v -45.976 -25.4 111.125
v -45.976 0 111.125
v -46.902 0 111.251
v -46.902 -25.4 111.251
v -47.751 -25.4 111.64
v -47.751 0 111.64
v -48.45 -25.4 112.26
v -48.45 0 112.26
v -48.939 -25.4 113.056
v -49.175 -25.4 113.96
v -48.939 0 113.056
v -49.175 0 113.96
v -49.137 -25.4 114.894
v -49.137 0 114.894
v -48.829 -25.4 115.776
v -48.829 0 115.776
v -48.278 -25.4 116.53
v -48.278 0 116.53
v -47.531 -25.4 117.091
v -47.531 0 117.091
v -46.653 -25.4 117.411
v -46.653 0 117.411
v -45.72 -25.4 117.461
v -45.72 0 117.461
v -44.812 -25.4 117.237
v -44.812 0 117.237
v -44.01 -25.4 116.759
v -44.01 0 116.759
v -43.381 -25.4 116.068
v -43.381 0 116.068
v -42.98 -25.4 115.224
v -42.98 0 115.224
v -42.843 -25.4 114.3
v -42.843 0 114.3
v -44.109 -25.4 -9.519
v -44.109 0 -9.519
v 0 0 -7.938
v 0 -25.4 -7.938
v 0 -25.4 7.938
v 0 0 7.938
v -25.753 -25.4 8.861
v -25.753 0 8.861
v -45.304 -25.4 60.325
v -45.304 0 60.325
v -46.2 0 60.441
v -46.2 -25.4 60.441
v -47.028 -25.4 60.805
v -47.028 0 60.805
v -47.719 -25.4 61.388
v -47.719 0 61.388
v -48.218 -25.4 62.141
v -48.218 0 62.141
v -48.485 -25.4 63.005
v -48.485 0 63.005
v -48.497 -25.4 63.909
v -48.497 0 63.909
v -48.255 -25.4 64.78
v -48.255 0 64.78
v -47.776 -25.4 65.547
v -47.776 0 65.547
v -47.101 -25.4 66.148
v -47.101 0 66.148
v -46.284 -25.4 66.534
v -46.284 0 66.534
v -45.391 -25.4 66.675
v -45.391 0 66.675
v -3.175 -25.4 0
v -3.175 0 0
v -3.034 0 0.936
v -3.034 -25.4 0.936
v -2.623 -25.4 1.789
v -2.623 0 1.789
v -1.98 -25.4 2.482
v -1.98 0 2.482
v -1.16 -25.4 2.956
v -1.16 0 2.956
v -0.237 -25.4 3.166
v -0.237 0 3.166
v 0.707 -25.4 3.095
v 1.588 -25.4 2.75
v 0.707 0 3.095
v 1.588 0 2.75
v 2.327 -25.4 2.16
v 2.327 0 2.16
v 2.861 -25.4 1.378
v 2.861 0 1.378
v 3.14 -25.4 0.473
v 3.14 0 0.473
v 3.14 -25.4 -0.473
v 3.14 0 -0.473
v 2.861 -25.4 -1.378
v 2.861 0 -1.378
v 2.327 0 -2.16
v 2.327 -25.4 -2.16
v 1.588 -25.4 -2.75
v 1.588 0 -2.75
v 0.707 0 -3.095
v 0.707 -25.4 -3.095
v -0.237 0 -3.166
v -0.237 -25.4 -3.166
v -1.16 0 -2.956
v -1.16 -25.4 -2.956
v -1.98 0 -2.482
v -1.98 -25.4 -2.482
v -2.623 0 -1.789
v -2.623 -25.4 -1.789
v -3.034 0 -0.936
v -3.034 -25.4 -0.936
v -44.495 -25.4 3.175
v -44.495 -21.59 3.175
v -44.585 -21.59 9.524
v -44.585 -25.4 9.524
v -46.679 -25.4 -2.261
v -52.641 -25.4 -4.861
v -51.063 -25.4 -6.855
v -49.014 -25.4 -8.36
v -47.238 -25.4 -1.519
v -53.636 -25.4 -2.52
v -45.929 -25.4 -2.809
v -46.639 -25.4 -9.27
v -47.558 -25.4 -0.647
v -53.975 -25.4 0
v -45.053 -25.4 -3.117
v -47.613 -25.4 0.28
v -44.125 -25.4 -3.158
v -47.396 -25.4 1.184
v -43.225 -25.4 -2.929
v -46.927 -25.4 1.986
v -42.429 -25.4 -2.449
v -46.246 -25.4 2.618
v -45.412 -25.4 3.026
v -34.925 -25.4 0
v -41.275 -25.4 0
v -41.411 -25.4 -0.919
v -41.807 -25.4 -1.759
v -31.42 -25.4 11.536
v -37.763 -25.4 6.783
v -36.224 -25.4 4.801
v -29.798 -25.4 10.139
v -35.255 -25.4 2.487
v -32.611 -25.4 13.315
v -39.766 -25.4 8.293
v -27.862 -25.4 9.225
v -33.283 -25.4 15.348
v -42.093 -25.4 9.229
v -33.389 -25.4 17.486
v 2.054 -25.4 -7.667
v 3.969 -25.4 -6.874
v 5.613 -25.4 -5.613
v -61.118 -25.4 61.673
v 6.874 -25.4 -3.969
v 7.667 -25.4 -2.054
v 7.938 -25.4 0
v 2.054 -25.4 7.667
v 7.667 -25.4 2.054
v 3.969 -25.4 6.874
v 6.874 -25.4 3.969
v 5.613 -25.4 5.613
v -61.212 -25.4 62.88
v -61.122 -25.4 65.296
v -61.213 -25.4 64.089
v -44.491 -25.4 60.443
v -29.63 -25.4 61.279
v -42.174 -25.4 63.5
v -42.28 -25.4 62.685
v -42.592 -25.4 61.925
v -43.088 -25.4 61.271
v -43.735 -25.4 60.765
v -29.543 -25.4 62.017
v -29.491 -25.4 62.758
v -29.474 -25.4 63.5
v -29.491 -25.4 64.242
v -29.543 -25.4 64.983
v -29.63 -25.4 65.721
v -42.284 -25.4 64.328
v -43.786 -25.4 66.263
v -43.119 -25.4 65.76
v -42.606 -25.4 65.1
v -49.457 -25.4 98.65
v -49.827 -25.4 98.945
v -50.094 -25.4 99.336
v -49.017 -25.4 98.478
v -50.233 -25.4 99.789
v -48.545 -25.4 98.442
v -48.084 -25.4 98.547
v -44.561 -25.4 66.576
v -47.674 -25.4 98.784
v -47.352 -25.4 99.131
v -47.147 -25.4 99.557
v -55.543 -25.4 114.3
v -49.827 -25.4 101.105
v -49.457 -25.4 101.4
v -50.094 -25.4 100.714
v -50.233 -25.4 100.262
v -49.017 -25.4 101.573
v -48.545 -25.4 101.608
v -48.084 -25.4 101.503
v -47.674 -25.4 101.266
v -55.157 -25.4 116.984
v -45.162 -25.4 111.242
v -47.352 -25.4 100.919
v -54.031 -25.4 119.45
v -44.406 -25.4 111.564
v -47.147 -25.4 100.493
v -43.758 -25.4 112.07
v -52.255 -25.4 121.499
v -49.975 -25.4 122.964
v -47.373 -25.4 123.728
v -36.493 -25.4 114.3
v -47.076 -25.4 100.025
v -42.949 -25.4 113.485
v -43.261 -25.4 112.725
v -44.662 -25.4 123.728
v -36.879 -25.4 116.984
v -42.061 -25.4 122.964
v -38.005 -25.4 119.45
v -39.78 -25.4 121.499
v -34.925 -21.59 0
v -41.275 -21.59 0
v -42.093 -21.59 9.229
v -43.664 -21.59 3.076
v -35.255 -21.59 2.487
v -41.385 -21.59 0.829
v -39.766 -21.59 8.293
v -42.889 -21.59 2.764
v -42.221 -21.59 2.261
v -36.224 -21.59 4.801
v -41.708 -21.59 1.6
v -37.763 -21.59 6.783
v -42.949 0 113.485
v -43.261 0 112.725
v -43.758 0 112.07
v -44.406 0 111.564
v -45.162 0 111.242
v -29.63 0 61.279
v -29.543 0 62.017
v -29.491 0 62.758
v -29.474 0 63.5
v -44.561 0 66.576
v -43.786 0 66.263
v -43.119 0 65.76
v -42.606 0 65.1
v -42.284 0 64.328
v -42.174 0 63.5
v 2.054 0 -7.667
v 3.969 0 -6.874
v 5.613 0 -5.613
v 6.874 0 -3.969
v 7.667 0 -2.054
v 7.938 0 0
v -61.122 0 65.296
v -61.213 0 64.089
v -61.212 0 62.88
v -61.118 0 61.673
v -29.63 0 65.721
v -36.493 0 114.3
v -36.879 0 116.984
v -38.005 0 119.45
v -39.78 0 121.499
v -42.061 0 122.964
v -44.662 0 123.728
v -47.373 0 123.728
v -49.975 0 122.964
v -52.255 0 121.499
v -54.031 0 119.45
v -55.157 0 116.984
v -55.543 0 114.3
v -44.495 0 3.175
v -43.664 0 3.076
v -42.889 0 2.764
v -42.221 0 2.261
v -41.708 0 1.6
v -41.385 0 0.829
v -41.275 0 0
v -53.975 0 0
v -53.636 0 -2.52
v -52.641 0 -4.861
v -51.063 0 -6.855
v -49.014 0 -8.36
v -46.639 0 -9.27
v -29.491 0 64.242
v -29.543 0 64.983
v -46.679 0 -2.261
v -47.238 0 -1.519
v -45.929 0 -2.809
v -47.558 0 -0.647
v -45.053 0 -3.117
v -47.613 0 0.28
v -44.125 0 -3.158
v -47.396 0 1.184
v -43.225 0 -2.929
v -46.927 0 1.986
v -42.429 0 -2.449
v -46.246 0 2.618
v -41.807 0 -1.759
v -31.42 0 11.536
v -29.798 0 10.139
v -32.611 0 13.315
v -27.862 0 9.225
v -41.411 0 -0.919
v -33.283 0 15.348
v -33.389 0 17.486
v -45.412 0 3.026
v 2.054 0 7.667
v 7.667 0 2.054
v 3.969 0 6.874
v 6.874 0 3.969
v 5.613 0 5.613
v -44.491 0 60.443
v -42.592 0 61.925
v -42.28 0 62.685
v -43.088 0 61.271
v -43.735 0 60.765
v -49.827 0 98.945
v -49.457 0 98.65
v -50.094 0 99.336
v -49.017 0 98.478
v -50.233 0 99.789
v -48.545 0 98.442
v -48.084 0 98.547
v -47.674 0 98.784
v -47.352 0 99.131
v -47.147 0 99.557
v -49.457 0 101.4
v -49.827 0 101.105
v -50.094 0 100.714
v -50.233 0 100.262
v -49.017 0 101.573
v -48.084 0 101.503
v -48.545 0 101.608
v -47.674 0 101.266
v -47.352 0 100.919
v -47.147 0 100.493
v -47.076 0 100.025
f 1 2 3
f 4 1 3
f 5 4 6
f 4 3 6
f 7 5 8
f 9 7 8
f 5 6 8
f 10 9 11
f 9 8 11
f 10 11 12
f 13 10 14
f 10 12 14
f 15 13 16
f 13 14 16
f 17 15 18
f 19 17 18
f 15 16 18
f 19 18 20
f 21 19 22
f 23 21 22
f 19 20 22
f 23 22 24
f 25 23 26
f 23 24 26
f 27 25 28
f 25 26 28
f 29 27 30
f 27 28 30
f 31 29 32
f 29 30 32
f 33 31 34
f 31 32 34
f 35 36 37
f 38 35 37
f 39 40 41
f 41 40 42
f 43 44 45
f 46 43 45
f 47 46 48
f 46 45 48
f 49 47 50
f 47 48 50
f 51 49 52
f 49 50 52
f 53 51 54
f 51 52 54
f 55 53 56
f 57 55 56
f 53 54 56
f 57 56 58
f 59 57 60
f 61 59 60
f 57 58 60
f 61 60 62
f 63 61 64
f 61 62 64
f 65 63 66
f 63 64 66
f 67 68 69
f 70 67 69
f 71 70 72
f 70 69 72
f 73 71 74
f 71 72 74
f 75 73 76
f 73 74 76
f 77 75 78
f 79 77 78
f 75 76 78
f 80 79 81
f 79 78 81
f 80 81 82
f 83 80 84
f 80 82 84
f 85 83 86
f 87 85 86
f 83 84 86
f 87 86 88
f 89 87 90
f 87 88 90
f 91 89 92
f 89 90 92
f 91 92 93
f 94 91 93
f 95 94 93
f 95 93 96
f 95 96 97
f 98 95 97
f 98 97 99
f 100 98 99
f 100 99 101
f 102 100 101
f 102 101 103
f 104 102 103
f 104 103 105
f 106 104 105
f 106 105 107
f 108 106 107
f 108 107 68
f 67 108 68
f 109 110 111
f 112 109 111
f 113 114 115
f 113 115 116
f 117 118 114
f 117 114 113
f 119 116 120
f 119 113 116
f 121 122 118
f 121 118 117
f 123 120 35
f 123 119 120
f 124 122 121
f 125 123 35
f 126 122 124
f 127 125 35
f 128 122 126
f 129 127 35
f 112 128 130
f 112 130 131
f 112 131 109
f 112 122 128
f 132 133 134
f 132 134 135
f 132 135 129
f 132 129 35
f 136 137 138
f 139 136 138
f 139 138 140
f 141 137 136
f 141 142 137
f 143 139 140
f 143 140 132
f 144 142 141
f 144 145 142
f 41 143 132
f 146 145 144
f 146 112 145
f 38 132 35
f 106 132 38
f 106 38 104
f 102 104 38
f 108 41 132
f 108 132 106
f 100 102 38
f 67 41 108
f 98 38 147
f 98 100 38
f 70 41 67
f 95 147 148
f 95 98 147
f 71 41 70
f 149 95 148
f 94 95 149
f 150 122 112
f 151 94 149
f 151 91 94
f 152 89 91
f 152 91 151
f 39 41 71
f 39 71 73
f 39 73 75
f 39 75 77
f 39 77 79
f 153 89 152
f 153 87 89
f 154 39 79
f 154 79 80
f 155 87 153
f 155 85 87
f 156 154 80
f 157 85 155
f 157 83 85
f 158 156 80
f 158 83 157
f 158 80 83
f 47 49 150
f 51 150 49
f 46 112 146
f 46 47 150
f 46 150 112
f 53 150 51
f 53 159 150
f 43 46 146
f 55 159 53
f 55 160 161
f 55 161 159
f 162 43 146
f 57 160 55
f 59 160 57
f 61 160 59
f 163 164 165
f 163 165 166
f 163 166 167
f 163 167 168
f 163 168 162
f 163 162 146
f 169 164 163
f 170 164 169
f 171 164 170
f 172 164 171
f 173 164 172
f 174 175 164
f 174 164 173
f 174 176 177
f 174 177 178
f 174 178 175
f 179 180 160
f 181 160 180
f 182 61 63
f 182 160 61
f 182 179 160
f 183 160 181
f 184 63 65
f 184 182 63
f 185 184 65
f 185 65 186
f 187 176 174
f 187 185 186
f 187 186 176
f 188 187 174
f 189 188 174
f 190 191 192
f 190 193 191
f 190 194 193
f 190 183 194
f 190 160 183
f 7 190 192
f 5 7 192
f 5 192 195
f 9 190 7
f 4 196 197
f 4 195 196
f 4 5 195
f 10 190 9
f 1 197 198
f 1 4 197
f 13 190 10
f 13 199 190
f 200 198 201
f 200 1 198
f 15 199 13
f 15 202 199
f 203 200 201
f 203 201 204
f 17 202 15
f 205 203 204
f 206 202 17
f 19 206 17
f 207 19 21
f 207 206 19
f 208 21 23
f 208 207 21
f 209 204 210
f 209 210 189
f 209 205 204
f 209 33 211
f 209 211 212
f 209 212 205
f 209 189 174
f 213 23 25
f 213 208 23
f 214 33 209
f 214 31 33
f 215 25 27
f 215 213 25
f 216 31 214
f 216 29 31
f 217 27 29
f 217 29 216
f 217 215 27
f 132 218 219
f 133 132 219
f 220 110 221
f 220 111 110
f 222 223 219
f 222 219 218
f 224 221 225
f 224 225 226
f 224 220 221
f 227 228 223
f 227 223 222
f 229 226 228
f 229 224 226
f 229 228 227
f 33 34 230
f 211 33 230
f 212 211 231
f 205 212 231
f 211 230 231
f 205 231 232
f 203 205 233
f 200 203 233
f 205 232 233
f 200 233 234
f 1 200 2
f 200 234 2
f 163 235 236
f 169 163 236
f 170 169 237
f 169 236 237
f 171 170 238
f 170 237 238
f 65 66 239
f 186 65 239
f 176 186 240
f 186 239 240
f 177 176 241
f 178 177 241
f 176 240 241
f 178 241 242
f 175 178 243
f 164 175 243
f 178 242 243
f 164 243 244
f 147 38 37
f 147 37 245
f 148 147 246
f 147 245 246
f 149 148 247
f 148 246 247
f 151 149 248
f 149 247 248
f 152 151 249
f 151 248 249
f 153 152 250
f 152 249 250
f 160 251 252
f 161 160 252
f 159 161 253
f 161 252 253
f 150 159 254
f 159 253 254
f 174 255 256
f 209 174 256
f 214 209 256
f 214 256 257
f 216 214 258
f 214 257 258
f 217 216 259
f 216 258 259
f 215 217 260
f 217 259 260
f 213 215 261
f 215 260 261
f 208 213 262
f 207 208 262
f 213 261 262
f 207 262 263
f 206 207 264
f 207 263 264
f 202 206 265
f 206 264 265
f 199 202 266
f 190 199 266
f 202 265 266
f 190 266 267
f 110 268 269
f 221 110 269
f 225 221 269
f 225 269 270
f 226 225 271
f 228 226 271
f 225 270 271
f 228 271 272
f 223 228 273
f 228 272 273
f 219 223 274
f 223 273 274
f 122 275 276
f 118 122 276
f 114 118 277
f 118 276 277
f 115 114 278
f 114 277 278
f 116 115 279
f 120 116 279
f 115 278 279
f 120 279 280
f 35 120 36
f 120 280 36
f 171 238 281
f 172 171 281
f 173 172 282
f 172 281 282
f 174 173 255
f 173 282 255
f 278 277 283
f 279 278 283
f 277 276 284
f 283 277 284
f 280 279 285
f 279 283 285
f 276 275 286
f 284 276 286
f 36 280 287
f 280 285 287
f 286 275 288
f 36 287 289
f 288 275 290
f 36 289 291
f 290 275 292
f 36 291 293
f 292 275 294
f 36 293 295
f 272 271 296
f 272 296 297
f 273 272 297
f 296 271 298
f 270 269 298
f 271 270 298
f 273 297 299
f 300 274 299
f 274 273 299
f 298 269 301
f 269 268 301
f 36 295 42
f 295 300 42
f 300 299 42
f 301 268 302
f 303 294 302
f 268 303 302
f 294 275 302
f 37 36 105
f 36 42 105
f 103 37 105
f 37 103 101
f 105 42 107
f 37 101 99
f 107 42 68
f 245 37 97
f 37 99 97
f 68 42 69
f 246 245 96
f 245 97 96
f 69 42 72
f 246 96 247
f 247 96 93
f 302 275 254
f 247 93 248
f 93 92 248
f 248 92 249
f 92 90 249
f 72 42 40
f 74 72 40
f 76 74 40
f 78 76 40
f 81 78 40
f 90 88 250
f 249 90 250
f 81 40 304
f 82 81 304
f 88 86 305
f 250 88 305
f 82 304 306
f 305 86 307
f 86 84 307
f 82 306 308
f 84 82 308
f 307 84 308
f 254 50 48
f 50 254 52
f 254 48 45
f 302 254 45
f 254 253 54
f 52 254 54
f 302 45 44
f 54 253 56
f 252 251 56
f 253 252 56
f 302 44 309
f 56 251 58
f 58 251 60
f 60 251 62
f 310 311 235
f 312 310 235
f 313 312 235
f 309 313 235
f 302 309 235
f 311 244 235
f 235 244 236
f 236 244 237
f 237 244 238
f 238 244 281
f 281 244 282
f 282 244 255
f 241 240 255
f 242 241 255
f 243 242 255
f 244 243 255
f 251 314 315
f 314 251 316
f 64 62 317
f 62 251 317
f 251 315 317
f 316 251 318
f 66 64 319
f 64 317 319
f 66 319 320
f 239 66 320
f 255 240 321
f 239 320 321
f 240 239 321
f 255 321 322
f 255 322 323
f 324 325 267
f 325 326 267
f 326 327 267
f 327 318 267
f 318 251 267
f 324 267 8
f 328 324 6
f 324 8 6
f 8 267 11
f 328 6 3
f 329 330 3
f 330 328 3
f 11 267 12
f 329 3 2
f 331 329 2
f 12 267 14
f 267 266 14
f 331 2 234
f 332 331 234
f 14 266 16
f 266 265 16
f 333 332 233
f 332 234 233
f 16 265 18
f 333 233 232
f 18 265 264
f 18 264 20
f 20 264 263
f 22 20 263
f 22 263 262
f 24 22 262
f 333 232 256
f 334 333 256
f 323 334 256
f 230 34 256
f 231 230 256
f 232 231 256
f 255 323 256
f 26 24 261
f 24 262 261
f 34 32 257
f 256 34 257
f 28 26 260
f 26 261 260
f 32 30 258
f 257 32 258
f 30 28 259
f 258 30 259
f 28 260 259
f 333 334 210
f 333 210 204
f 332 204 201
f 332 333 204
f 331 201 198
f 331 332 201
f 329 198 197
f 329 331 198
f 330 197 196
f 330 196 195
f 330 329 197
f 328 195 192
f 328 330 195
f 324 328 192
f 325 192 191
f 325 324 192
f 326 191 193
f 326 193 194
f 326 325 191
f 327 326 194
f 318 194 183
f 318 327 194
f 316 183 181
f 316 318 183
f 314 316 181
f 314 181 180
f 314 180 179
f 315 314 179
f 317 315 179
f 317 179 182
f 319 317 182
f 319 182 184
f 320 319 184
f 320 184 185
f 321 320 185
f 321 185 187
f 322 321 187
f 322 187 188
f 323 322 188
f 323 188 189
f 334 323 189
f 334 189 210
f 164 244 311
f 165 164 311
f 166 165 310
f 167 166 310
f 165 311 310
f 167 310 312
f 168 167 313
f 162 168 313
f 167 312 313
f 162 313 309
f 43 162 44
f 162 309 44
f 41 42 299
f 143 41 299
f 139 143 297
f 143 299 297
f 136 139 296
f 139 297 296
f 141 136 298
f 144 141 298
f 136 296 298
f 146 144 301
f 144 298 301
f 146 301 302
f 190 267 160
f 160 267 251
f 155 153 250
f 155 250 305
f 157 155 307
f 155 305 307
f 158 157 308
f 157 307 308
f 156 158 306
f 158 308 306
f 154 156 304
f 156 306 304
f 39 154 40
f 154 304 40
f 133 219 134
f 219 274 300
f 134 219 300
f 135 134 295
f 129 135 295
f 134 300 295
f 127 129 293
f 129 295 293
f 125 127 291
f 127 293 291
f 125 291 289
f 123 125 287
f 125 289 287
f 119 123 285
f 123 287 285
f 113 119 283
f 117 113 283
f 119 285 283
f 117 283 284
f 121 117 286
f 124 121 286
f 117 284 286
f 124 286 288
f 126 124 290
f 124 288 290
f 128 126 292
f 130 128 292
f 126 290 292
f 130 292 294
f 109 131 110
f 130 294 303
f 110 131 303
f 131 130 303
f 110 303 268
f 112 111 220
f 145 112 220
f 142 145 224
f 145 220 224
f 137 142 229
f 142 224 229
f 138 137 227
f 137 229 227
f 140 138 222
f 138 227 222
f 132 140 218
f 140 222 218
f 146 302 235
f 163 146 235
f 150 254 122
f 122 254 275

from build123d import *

# Parameters (mm, degrees)
F0_R     = 1.5875
F1_DEPTH = 25.4
F2_DEPTH = 21.59


with BuildPart() as f1:
    # F0 (on Front) → F1 (new body)
    with BuildSketch(Plane.XZ):
        with BuildLine():
            ThreePointArc((-45.8923771413, 104.7758257242), (-39.2384052999, 107.6092963617), (-36.4927939024, 114.3))
            ThreePointArc((-36.4927939024, 114.3), (-46.0177939024, 123.825), (-55.5427939024, 114.3))
            ThreePointArc((-55.5427939024, 114.3), (-52.7084975407, 107.5206113974), (-45.8923771413, 104.7758257242))
        make_face()
        with BuildLine():
            ThreePointArc((-42.8427939024, 114.3), (-43.7579977016, 112.0697654539), (-45.9759883154, 111.1252752414))
            ThreePointArc((-45.9759883154, 111.1252752414), (-48.2775901033, 116.5302345461), (-42.8427939024, 114.3))
        make_face(mode=Mode.SUBTRACT)
        with BuildLine():
            Line((-29.6299272337, 65.7206308807), (-36.4927939024, 114.3))
            ThreePointArc((-36.4927939024, 114.3), (-39.2384052999, 107.6092963617), (-45.8923771413, 104.7758257242))
            Line((-45.8923771413, 104.7758257242), (-45.5578744539, 79.373623793))
            ThreePointArc((-45.5578744539, 79.373623793), (-35.0173298688, 75.5530240484), (-29.6299272337, 65.7206308807))
        make_face()
        with BuildLine():
            ThreePointArc((-45.8923771413, 104.7758257242), (-52.7084975407, 107.5206113974), (-55.5427939024, 114.3))
            Line((-55.5427939024, 114.3), (-61.1219506134, 65.2957762162))
            ThreePointArc((-61.1219506134, 65.2957762162), (-55.9979584138, 75.2733614931), (-45.5578744539, 79.373623793))
            Line((-45.5578744539, 79.373623793), (-45.8923771413, 104.7758257242))
        make_face()
        with Locations((-48.6637000366, 100.0252)):
            Circle(F0_R, mode=Mode.SUBTRACT)
        with BuildLine():
            ThreePointArc((-29.4738465188, 63.5), (-29.5129147708, 64.6130546592), (-29.6299272337, 65.7206308807))
            ThreePointArc((-29.6299272337, 65.7206308807), (-35.0173298688, 75.5530240484), (-45.5578744539, 79.373623793))
            Line((-45.5578744539, 79.373623793), (-45.3906521058, 66.6747247586))
            ThreePointArc((-45.3906521058, 66.6747247586), (-43.1186119727, 65.7597962009), (-42.1738465188, 63.5))
            ThreePointArc((-42.1738465188, 63.5), (-43.087950392, 61.2708805092), (-45.3039086946, 60.3253180329))
            Line((-45.3039086946, 60.3253180329), (-45.124157398, 47.6265901647))
            ThreePointArc((-45.124157398, 47.6265901647), (-34.8536449701, 51.5892330451), (-29.6299272337, 61.2793691193))
            ThreePointArc((-29.6299272337, 61.2793691193), (-29.5129147708, 62.3869453408), (-29.4738465188, 63.5))
        make_face()
        with BuildLine():
            ThreePointArc((-45.5578744539, 79.373623793), (-55.9979584138, 75.2733614931), (-61.1219506134, 65.2957762162))
            ThreePointArc((-61.1219506134, 65.2957762162), (-61.2238389716, 63.4845202884), (-61.1184184978, 61.6734665075))
            ThreePointArc((-61.1184184978, 61.6734665075), (-55.8245101978, 51.5720456287), (-45.124157398, 47.6265901647))
            Line((-45.124157398, 47.6265901647), (-45.3039086946, 60.3253180329))
            ThreePointArc((-45.3039086946, 60.3253180329), (-48.5235502679, 63.4566282891), (-45.3906521058, 66.6747247586))
            Line((-45.3906521058, 66.6747247586), (-45.5578744539, 79.373623793))
        make_face()
        with BuildLine():
            ThreePointArc((-45.124157398, 47.6265901647), (-55.8245101978, 51.5720456287), (-61.1184184978, 61.6734665075))
            Line((-61.1184184978, 61.6734665075), (-53.975, 0))
            ThreePointArc((-53.975, 0), (-51.2326883802, 6.6873584723), (-44.5848134725, 9.5240459012))
            Line((-44.5848134725, 9.5240459012), (-45.124157398, 47.6265901647))
        make_face()
        with BuildLine():
            Line((-33.3890422301, 17.4858067619), (-29.6299272337, 61.2793691193))
            ThreePointArc((-29.6299272337, 61.2793691193), (-34.8536449701, 51.5892330451), (-45.124157398, 47.6265901647))
            Line((-45.124157398, 47.6265901647), (-44.5848134725, 9.5240459012))
            ThreePointArc((-44.5848134725, 9.5240459012), (-37.7626415277, 6.7826883802), (-34.925, 0))
            Line((-34.925, 0), (-7.9375, 0))
            ThreePointArc((-7.9375, 0), (-5.6126600757, 5.6126600757), (0, 7.9375))
            Line((0, 7.9375), (-25.7528172131, 8.8607889455))
            ThreePointArc((-25.7528172131, 8.8607889455), (-31.4204494391, 11.5358115277), (-33.3890422301, 17.4858067619))
        make_face()
        with BuildLine():
            ThreePointArc((-44.5848134725, 9.5240459012), (-51.2326883802, 6.6873584723), (-53.975, 0))
            ThreePointArc((-53.975, 0), (-51.0634341324, -6.8547876682), (-44.1087293489, -9.5188843539))
            ThreePointArc((-44.1087293489, -9.5188843539), (-37.5952123318, -6.6134341324), (-34.925, 0))
            Line((-34.925, 0), (-41.275, 0))
            ThreePointArc((-41.275, 0), (-46.6791194908, -2.2608961267), (-44.4949378242, 3.1746819671))
            Line((-44.4949378242, 3.1746819671), (-44.5848134725, 9.5240459012))
        make_face()
        with BuildLine():
            ThreePointArc((-34.925, 0), (-37.5952123318, -6.6134341324), (-44.1087293489, -9.5188843539))
            Line((-44.1087293489, -9.5188843539), (0, -7.9375))
            ThreePointArc((0, -7.9375), (-5.6126600757, -5.6126600757), (-7.9375, 0))
            Line((-7.9375, 0), (-34.925, 0))
        make_face()
        with BuildLine():
            ThreePointArc((-7.9375, 0), (-5.6126600757, -5.6126600757), (0, -7.9375))
            ThreePointArc((0, -7.9375), (5.6126600757, -5.6126600757), (7.9375, 0))
            ThreePointArc((7.9375, 0), (5.6126600757, 5.6126600757), (0, 7.9375))
            ThreePointArc((0, 7.9375), (-5.6126600757, 5.6126600757), (-7.9375, 0))
        make_face()
        with BuildLine():
            ThreePointArc((3.175, 0), (0, -3.175), (-3.175, 0))
            ThreePointArc((-3.175, 0), (0, 3.175), (3.175, 0))
        make_face(mode=Mode.SUBTRACT)
    extrude(amount=F1_DEPTH)

    # F0 (on Front) → F2 (join)
    with BuildSketch(Plane.XZ):
        with BuildLine():
            ThreePointArc((-45.8923771413, 104.7758257242), (-39.2384052999, 107.6092963617), (-36.4927939024, 114.3))
            ThreePointArc((-36.4927939024, 114.3), (-46.0177939024, 123.825), (-55.5427939024, 114.3))
            ThreePointArc((-55.5427939024, 114.3), (-52.7084975407, 107.5206113974), (-45.8923771413, 104.7758257242))
        make_face()
        with BuildLine():
            ThreePointArc((-42.8427939024, 114.3), (-43.7579977016, 112.0697654539), (-45.9759883154, 111.1252752414))
            ThreePointArc((-45.9759883154, 111.1252752414), (-48.2775901033, 116.5302345461), (-42.8427939024, 114.3))
        make_face(mode=Mode.SUBTRACT)
        with BuildLine():
            Line((-29.6299272337, 65.7206308807), (-36.4927939024, 114.3))
            ThreePointArc((-36.4927939024, 114.3), (-39.2384052999, 107.6092963617), (-45.8923771413, 104.7758257242))
            Line((-45.8923771413, 104.7758257242), (-45.5578744539, 79.373623793))
            ThreePointArc((-45.5578744539, 79.373623793), (-35.0173298688, 75.5530240484), (-29.6299272337, 65.7206308807))
        make_face()
        with BuildLine():
            ThreePointArc((-45.8923771413, 104.7758257242), (-52.7084975407, 107.5206113974), (-55.5427939024, 114.3))
            Line((-55.5427939024, 114.3), (-61.1219506134, 65.2957762162))
            ThreePointArc((-61.1219506134, 65.2957762162), (-55.9979584138, 75.2733614931), (-45.5578744539, 79.373623793))
            Line((-45.5578744539, 79.373623793), (-45.8923771413, 104.7758257242))
        make_face()
        with Locations((-48.6637000366, 100.0252)):
            Circle(F0_R, mode=Mode.SUBTRACT)
        with BuildLine():
            ThreePointArc((-29.4738465188, 63.5), (-29.5129147708, 64.6130546592), (-29.6299272337, 65.7206308807))
            ThreePointArc((-29.6299272337, 65.7206308807), (-35.0173298688, 75.5530240484), (-45.5578744539, 79.373623793))
            Line((-45.5578744539, 79.373623793), (-45.3906521058, 66.6747247586))
            ThreePointArc((-45.3906521058, 66.6747247586), (-43.1186119727, 65.7597962009), (-42.1738465188, 63.5))
            ThreePointArc((-42.1738465188, 63.5), (-43.087950392, 61.2708805092), (-45.3039086946, 60.3253180329))
            Line((-45.3039086946, 60.3253180329), (-45.124157398, 47.6265901647))
            ThreePointArc((-45.124157398, 47.6265901647), (-34.8536449701, 51.5892330451), (-29.6299272337, 61.2793691193))
            ThreePointArc((-29.6299272337, 61.2793691193), (-29.5129147708, 62.3869453408), (-29.4738465188, 63.5))
        make_face()
        with BuildLine():
            ThreePointArc((-45.5578744539, 79.373623793), (-55.9979584138, 75.2733614931), (-61.1219506134, 65.2957762162))
            ThreePointArc((-61.1219506134, 65.2957762162), (-61.2238389716, 63.4845202884), (-61.1184184978, 61.6734665075))
            ThreePointArc((-61.1184184978, 61.6734665075), (-55.8245101978, 51.5720456287), (-45.124157398, 47.6265901647))
            Line((-45.124157398, 47.6265901647), (-45.3039086946, 60.3253180329))
            ThreePointArc((-45.3039086946, 60.3253180329), (-48.5235502679, 63.4566282891), (-45.3906521058, 66.6747247586))
            Line((-45.3906521058, 66.6747247586), (-45.5578744539, 79.373623793))
        make_face()
        with BuildLine():
            ThreePointArc((-45.124157398, 47.6265901647), (-55.8245101978, 51.5720456287), (-61.1184184978, 61.6734665075))
            Line((-61.1184184978, 61.6734665075), (-53.975, 0))
            ThreePointArc((-53.975, 0), (-51.2326883802, 6.6873584723), (-44.5848134725, 9.5240459012))
            Line((-44.5848134725, 9.5240459012), (-45.124157398, 47.6265901647))
        make_face()
        with BuildLine():
            Line((-33.3890422301, 17.4858067619), (-29.6299272337, 61.2793691193))
            ThreePointArc((-29.6299272337, 61.2793691193), (-34.8536449701, 51.5892330451), (-45.124157398, 47.6265901647))
            Line((-45.124157398, 47.6265901647), (-44.5848134725, 9.5240459012))
            ThreePointArc((-44.5848134725, 9.5240459012), (-37.7626415277, 6.7826883802), (-34.925, 0))
            Line((-34.925, 0), (-7.9375, 0))
            ThreePointArc((-7.9375, 0), (-5.6126600757, 5.6126600757), (0, 7.9375))
            Line((0, 7.9375), (-25.7528172131, 8.8607889455))
            ThreePointArc((-25.7528172131, 8.8607889455), (-31.4204494391, 11.5358115277), (-33.3890422301, 17.4858067619))
        make_face()
        with BuildLine():
            ThreePointArc((-44.5848134725, 9.5240459012), (-51.2326883802, 6.6873584723), (-53.975, 0))
            ThreePointArc((-53.975, 0), (-51.0634341324, -6.8547876682), (-44.1087293489, -9.5188843539))
            ThreePointArc((-44.1087293489, -9.5188843539), (-37.5952123318, -6.6134341324), (-34.925, 0))
            Line((-34.925, 0), (-41.275, 0))
            ThreePointArc((-41.275, 0), (-46.6791194908, -2.2608961267), (-44.4949378242, 3.1746819671))
            Line((-44.4949378242, 3.1746819671), (-44.5848134725, 9.5240459012))
        make_face()
        with BuildLine():
            ThreePointArc((-34.925, 0), (-37.5952123318, -6.6134341324), (-44.1087293489, -9.5188843539))
            Line((-44.1087293489, -9.5188843539), (0, -7.9375))
            ThreePointArc((0, -7.9375), (-5.6126600757, -5.6126600757), (-7.9375, 0))
            Line((-7.9375, 0), (-34.925, 0))
        make_face()
        with BuildLine():
            ThreePointArc((-7.9375, 0), (-5.6126600757, -5.6126600757), (0, -7.9375))
            ThreePointArc((0, -7.9375), (5.6126600757, -5.6126600757), (7.9375, 0))
            ThreePointArc((7.9375, 0), (5.6126600757, 5.6126600757), (0, 7.9375))
            ThreePointArc((0, 7.9375), (-5.6126600757, 5.6126600757), (-7.9375, 0))
        make_face()
        with BuildLine():
            ThreePointArc((3.175, 0), (0, -3.175), (-3.175, 0))
            ThreePointArc((-3.175, 0), (0, 3.175), (3.175, 0))
        make_face(mode=Mode.SUBTRACT)
        with BuildLine():
            ThreePointArc((-34.925, 0), (-37.7626415277, 6.7826883802), (-44.5848134725, 9.5240459012))
            Line((-44.5848134725, 9.5240459012), (-44.4949378242, 3.1746819671))
            ThreePointArc((-44.4949378242, 3.1746819671), (-42.2208805092, 2.2608961267), (-41.275, 0))
            Line((-41.275, 0), (-34.925, 0))
        make_face()
    extrude(amount=F2_DEPTH)


solid = f1.part
